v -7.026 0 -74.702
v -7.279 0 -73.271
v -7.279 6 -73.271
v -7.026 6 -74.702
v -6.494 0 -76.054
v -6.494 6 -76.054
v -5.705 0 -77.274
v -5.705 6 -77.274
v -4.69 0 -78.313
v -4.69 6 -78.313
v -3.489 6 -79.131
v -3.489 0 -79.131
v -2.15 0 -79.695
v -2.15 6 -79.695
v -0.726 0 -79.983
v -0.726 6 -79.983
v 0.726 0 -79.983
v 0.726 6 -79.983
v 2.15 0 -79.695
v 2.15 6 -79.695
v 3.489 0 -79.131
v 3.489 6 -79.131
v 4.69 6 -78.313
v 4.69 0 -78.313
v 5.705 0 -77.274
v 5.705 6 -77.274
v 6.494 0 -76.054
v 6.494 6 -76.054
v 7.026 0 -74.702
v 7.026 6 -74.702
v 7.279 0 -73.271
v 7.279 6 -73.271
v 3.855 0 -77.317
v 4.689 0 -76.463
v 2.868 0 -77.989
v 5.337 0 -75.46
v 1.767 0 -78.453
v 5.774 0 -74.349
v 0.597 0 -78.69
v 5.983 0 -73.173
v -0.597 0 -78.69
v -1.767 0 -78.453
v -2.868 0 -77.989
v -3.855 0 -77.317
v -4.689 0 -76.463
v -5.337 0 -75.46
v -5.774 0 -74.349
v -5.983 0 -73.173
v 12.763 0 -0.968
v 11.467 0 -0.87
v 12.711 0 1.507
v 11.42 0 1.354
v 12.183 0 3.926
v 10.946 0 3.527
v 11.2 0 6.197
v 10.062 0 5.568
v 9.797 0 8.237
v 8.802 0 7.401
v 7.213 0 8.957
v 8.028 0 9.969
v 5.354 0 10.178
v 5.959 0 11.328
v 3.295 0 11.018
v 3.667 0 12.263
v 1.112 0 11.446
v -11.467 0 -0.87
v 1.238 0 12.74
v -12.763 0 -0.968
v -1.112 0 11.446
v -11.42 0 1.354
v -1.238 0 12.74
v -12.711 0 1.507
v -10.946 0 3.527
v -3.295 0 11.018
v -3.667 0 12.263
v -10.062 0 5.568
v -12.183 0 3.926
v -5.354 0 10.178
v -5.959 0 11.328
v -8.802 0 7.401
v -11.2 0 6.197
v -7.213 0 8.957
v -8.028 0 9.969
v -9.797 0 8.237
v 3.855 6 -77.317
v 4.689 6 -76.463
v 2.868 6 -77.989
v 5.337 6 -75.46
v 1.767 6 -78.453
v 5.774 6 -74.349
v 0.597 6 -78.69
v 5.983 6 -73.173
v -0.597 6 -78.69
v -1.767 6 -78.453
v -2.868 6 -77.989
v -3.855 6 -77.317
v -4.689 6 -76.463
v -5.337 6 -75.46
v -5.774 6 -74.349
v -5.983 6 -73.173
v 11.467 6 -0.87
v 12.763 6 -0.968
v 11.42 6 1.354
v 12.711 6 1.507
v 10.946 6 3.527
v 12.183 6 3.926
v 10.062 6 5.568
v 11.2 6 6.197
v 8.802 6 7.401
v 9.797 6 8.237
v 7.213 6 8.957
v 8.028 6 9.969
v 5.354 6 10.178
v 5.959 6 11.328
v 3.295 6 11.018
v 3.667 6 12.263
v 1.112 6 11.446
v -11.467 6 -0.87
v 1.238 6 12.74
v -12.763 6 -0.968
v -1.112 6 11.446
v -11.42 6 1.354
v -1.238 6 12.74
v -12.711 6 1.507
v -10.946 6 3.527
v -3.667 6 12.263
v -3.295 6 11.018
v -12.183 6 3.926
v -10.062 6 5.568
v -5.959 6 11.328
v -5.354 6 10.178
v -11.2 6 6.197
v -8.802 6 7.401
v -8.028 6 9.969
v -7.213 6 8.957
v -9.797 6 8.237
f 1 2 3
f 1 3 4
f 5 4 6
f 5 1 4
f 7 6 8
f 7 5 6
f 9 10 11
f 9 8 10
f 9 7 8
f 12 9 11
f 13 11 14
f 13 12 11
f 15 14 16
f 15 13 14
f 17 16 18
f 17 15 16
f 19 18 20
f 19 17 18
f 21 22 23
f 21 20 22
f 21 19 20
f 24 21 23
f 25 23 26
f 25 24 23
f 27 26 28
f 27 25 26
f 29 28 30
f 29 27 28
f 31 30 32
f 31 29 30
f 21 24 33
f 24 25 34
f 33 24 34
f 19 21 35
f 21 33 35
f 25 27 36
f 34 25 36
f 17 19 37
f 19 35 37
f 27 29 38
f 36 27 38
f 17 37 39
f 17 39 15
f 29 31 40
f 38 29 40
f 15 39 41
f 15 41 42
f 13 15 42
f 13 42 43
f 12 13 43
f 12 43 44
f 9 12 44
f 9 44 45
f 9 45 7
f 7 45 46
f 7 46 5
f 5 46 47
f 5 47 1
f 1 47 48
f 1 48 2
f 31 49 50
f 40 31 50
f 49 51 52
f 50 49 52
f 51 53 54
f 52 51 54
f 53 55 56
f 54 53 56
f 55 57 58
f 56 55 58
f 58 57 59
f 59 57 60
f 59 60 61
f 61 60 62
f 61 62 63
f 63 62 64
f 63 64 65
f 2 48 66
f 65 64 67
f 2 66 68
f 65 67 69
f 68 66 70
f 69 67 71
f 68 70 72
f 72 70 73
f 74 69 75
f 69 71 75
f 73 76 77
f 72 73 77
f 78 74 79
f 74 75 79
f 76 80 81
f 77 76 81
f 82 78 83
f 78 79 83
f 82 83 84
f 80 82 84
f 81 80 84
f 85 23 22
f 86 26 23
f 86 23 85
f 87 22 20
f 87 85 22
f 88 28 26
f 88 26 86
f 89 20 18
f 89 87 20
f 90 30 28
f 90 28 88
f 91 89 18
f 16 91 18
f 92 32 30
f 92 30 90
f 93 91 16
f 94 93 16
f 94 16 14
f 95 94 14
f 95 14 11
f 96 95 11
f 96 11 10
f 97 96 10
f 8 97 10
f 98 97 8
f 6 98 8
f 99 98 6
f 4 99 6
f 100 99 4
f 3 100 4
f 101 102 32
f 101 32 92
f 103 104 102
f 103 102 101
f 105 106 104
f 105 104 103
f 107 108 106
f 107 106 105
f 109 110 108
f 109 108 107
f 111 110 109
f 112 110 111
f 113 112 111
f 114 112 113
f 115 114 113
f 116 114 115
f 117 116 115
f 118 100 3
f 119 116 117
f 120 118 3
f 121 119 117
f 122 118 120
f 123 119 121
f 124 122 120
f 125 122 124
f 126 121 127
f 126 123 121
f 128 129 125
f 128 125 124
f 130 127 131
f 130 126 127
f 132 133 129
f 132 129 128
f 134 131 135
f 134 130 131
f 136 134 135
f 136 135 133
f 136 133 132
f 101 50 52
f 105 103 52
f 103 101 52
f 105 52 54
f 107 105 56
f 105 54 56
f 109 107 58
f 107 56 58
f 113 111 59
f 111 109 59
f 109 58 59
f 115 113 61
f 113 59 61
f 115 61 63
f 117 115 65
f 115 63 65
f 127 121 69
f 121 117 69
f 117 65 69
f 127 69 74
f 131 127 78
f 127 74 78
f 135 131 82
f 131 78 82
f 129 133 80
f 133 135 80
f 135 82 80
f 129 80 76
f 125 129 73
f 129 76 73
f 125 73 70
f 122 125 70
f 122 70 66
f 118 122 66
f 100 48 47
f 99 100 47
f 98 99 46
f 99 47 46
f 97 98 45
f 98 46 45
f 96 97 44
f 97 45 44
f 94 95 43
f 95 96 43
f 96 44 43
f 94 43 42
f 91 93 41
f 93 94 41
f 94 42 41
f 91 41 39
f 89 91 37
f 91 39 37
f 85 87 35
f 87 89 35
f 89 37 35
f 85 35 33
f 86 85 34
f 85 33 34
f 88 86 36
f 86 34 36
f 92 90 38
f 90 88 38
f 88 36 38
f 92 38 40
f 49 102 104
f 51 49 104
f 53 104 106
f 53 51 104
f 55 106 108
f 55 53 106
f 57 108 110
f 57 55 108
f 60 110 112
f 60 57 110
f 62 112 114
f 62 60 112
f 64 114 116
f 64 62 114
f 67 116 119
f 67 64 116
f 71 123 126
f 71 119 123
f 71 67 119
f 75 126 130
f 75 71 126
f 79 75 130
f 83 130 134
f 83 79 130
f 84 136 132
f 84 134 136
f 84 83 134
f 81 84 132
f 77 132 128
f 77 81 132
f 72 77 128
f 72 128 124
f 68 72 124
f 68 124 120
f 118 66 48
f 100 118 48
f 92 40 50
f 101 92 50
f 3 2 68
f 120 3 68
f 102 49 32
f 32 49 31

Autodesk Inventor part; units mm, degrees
ref_plane "YZ Plane" through (0, 0, 0) normal (1, 0, 0) x (0, 1, 0)
ref_plane "XZ Plane" through (0, 0, 0) normal (0, 1, 0) x (-1, 0, 0)
ref_plane "XY Plane" through (0, 0, 0) normal (0, 0, 1) x (1, 0, 0)
sketch "Sketch1" plane through (0, 0, 0) normal (0, 1, 0) x (-1, 0, 0)
  arc A0 (11.4671, -0.8698) -> (-11.4671, -0.8698) centre (0, 0) ccw
  arc A1 (-5.9828, -73.1731) -> (5.9828, -73.1731) centre (0, -72.7193) ccw
  line L0 (11.4671, -0.8698) -> (5.9828, -73.1731)
  line L1 (-5.9828, -73.1731) -> (-11.4671, -0.8698)
  line L2 (7.2791, -73.2714) -> (12.7633, -0.9681)
  arc A2 (12.7633, -0.9681) -> (-12.7633, -0.9681) centre (0, 0) ccw
  line L3 (-12.7633, -0.9681) -> (-7.2791, -73.2714)
  arc A3 (-7.2791, -73.2714) -> (7.2791, -73.2714) centre (0, -72.7193) ccw
  dimension "d0" = 23
  dimension "d1" = 12
  dimension "d2" = 72.511
  dimension "d6" = 1.3
extrude "Extrusion1" add sketch "Sketch1" along normal blind 6
properties part number "tandriem32Tnaar16T_lengte200"
